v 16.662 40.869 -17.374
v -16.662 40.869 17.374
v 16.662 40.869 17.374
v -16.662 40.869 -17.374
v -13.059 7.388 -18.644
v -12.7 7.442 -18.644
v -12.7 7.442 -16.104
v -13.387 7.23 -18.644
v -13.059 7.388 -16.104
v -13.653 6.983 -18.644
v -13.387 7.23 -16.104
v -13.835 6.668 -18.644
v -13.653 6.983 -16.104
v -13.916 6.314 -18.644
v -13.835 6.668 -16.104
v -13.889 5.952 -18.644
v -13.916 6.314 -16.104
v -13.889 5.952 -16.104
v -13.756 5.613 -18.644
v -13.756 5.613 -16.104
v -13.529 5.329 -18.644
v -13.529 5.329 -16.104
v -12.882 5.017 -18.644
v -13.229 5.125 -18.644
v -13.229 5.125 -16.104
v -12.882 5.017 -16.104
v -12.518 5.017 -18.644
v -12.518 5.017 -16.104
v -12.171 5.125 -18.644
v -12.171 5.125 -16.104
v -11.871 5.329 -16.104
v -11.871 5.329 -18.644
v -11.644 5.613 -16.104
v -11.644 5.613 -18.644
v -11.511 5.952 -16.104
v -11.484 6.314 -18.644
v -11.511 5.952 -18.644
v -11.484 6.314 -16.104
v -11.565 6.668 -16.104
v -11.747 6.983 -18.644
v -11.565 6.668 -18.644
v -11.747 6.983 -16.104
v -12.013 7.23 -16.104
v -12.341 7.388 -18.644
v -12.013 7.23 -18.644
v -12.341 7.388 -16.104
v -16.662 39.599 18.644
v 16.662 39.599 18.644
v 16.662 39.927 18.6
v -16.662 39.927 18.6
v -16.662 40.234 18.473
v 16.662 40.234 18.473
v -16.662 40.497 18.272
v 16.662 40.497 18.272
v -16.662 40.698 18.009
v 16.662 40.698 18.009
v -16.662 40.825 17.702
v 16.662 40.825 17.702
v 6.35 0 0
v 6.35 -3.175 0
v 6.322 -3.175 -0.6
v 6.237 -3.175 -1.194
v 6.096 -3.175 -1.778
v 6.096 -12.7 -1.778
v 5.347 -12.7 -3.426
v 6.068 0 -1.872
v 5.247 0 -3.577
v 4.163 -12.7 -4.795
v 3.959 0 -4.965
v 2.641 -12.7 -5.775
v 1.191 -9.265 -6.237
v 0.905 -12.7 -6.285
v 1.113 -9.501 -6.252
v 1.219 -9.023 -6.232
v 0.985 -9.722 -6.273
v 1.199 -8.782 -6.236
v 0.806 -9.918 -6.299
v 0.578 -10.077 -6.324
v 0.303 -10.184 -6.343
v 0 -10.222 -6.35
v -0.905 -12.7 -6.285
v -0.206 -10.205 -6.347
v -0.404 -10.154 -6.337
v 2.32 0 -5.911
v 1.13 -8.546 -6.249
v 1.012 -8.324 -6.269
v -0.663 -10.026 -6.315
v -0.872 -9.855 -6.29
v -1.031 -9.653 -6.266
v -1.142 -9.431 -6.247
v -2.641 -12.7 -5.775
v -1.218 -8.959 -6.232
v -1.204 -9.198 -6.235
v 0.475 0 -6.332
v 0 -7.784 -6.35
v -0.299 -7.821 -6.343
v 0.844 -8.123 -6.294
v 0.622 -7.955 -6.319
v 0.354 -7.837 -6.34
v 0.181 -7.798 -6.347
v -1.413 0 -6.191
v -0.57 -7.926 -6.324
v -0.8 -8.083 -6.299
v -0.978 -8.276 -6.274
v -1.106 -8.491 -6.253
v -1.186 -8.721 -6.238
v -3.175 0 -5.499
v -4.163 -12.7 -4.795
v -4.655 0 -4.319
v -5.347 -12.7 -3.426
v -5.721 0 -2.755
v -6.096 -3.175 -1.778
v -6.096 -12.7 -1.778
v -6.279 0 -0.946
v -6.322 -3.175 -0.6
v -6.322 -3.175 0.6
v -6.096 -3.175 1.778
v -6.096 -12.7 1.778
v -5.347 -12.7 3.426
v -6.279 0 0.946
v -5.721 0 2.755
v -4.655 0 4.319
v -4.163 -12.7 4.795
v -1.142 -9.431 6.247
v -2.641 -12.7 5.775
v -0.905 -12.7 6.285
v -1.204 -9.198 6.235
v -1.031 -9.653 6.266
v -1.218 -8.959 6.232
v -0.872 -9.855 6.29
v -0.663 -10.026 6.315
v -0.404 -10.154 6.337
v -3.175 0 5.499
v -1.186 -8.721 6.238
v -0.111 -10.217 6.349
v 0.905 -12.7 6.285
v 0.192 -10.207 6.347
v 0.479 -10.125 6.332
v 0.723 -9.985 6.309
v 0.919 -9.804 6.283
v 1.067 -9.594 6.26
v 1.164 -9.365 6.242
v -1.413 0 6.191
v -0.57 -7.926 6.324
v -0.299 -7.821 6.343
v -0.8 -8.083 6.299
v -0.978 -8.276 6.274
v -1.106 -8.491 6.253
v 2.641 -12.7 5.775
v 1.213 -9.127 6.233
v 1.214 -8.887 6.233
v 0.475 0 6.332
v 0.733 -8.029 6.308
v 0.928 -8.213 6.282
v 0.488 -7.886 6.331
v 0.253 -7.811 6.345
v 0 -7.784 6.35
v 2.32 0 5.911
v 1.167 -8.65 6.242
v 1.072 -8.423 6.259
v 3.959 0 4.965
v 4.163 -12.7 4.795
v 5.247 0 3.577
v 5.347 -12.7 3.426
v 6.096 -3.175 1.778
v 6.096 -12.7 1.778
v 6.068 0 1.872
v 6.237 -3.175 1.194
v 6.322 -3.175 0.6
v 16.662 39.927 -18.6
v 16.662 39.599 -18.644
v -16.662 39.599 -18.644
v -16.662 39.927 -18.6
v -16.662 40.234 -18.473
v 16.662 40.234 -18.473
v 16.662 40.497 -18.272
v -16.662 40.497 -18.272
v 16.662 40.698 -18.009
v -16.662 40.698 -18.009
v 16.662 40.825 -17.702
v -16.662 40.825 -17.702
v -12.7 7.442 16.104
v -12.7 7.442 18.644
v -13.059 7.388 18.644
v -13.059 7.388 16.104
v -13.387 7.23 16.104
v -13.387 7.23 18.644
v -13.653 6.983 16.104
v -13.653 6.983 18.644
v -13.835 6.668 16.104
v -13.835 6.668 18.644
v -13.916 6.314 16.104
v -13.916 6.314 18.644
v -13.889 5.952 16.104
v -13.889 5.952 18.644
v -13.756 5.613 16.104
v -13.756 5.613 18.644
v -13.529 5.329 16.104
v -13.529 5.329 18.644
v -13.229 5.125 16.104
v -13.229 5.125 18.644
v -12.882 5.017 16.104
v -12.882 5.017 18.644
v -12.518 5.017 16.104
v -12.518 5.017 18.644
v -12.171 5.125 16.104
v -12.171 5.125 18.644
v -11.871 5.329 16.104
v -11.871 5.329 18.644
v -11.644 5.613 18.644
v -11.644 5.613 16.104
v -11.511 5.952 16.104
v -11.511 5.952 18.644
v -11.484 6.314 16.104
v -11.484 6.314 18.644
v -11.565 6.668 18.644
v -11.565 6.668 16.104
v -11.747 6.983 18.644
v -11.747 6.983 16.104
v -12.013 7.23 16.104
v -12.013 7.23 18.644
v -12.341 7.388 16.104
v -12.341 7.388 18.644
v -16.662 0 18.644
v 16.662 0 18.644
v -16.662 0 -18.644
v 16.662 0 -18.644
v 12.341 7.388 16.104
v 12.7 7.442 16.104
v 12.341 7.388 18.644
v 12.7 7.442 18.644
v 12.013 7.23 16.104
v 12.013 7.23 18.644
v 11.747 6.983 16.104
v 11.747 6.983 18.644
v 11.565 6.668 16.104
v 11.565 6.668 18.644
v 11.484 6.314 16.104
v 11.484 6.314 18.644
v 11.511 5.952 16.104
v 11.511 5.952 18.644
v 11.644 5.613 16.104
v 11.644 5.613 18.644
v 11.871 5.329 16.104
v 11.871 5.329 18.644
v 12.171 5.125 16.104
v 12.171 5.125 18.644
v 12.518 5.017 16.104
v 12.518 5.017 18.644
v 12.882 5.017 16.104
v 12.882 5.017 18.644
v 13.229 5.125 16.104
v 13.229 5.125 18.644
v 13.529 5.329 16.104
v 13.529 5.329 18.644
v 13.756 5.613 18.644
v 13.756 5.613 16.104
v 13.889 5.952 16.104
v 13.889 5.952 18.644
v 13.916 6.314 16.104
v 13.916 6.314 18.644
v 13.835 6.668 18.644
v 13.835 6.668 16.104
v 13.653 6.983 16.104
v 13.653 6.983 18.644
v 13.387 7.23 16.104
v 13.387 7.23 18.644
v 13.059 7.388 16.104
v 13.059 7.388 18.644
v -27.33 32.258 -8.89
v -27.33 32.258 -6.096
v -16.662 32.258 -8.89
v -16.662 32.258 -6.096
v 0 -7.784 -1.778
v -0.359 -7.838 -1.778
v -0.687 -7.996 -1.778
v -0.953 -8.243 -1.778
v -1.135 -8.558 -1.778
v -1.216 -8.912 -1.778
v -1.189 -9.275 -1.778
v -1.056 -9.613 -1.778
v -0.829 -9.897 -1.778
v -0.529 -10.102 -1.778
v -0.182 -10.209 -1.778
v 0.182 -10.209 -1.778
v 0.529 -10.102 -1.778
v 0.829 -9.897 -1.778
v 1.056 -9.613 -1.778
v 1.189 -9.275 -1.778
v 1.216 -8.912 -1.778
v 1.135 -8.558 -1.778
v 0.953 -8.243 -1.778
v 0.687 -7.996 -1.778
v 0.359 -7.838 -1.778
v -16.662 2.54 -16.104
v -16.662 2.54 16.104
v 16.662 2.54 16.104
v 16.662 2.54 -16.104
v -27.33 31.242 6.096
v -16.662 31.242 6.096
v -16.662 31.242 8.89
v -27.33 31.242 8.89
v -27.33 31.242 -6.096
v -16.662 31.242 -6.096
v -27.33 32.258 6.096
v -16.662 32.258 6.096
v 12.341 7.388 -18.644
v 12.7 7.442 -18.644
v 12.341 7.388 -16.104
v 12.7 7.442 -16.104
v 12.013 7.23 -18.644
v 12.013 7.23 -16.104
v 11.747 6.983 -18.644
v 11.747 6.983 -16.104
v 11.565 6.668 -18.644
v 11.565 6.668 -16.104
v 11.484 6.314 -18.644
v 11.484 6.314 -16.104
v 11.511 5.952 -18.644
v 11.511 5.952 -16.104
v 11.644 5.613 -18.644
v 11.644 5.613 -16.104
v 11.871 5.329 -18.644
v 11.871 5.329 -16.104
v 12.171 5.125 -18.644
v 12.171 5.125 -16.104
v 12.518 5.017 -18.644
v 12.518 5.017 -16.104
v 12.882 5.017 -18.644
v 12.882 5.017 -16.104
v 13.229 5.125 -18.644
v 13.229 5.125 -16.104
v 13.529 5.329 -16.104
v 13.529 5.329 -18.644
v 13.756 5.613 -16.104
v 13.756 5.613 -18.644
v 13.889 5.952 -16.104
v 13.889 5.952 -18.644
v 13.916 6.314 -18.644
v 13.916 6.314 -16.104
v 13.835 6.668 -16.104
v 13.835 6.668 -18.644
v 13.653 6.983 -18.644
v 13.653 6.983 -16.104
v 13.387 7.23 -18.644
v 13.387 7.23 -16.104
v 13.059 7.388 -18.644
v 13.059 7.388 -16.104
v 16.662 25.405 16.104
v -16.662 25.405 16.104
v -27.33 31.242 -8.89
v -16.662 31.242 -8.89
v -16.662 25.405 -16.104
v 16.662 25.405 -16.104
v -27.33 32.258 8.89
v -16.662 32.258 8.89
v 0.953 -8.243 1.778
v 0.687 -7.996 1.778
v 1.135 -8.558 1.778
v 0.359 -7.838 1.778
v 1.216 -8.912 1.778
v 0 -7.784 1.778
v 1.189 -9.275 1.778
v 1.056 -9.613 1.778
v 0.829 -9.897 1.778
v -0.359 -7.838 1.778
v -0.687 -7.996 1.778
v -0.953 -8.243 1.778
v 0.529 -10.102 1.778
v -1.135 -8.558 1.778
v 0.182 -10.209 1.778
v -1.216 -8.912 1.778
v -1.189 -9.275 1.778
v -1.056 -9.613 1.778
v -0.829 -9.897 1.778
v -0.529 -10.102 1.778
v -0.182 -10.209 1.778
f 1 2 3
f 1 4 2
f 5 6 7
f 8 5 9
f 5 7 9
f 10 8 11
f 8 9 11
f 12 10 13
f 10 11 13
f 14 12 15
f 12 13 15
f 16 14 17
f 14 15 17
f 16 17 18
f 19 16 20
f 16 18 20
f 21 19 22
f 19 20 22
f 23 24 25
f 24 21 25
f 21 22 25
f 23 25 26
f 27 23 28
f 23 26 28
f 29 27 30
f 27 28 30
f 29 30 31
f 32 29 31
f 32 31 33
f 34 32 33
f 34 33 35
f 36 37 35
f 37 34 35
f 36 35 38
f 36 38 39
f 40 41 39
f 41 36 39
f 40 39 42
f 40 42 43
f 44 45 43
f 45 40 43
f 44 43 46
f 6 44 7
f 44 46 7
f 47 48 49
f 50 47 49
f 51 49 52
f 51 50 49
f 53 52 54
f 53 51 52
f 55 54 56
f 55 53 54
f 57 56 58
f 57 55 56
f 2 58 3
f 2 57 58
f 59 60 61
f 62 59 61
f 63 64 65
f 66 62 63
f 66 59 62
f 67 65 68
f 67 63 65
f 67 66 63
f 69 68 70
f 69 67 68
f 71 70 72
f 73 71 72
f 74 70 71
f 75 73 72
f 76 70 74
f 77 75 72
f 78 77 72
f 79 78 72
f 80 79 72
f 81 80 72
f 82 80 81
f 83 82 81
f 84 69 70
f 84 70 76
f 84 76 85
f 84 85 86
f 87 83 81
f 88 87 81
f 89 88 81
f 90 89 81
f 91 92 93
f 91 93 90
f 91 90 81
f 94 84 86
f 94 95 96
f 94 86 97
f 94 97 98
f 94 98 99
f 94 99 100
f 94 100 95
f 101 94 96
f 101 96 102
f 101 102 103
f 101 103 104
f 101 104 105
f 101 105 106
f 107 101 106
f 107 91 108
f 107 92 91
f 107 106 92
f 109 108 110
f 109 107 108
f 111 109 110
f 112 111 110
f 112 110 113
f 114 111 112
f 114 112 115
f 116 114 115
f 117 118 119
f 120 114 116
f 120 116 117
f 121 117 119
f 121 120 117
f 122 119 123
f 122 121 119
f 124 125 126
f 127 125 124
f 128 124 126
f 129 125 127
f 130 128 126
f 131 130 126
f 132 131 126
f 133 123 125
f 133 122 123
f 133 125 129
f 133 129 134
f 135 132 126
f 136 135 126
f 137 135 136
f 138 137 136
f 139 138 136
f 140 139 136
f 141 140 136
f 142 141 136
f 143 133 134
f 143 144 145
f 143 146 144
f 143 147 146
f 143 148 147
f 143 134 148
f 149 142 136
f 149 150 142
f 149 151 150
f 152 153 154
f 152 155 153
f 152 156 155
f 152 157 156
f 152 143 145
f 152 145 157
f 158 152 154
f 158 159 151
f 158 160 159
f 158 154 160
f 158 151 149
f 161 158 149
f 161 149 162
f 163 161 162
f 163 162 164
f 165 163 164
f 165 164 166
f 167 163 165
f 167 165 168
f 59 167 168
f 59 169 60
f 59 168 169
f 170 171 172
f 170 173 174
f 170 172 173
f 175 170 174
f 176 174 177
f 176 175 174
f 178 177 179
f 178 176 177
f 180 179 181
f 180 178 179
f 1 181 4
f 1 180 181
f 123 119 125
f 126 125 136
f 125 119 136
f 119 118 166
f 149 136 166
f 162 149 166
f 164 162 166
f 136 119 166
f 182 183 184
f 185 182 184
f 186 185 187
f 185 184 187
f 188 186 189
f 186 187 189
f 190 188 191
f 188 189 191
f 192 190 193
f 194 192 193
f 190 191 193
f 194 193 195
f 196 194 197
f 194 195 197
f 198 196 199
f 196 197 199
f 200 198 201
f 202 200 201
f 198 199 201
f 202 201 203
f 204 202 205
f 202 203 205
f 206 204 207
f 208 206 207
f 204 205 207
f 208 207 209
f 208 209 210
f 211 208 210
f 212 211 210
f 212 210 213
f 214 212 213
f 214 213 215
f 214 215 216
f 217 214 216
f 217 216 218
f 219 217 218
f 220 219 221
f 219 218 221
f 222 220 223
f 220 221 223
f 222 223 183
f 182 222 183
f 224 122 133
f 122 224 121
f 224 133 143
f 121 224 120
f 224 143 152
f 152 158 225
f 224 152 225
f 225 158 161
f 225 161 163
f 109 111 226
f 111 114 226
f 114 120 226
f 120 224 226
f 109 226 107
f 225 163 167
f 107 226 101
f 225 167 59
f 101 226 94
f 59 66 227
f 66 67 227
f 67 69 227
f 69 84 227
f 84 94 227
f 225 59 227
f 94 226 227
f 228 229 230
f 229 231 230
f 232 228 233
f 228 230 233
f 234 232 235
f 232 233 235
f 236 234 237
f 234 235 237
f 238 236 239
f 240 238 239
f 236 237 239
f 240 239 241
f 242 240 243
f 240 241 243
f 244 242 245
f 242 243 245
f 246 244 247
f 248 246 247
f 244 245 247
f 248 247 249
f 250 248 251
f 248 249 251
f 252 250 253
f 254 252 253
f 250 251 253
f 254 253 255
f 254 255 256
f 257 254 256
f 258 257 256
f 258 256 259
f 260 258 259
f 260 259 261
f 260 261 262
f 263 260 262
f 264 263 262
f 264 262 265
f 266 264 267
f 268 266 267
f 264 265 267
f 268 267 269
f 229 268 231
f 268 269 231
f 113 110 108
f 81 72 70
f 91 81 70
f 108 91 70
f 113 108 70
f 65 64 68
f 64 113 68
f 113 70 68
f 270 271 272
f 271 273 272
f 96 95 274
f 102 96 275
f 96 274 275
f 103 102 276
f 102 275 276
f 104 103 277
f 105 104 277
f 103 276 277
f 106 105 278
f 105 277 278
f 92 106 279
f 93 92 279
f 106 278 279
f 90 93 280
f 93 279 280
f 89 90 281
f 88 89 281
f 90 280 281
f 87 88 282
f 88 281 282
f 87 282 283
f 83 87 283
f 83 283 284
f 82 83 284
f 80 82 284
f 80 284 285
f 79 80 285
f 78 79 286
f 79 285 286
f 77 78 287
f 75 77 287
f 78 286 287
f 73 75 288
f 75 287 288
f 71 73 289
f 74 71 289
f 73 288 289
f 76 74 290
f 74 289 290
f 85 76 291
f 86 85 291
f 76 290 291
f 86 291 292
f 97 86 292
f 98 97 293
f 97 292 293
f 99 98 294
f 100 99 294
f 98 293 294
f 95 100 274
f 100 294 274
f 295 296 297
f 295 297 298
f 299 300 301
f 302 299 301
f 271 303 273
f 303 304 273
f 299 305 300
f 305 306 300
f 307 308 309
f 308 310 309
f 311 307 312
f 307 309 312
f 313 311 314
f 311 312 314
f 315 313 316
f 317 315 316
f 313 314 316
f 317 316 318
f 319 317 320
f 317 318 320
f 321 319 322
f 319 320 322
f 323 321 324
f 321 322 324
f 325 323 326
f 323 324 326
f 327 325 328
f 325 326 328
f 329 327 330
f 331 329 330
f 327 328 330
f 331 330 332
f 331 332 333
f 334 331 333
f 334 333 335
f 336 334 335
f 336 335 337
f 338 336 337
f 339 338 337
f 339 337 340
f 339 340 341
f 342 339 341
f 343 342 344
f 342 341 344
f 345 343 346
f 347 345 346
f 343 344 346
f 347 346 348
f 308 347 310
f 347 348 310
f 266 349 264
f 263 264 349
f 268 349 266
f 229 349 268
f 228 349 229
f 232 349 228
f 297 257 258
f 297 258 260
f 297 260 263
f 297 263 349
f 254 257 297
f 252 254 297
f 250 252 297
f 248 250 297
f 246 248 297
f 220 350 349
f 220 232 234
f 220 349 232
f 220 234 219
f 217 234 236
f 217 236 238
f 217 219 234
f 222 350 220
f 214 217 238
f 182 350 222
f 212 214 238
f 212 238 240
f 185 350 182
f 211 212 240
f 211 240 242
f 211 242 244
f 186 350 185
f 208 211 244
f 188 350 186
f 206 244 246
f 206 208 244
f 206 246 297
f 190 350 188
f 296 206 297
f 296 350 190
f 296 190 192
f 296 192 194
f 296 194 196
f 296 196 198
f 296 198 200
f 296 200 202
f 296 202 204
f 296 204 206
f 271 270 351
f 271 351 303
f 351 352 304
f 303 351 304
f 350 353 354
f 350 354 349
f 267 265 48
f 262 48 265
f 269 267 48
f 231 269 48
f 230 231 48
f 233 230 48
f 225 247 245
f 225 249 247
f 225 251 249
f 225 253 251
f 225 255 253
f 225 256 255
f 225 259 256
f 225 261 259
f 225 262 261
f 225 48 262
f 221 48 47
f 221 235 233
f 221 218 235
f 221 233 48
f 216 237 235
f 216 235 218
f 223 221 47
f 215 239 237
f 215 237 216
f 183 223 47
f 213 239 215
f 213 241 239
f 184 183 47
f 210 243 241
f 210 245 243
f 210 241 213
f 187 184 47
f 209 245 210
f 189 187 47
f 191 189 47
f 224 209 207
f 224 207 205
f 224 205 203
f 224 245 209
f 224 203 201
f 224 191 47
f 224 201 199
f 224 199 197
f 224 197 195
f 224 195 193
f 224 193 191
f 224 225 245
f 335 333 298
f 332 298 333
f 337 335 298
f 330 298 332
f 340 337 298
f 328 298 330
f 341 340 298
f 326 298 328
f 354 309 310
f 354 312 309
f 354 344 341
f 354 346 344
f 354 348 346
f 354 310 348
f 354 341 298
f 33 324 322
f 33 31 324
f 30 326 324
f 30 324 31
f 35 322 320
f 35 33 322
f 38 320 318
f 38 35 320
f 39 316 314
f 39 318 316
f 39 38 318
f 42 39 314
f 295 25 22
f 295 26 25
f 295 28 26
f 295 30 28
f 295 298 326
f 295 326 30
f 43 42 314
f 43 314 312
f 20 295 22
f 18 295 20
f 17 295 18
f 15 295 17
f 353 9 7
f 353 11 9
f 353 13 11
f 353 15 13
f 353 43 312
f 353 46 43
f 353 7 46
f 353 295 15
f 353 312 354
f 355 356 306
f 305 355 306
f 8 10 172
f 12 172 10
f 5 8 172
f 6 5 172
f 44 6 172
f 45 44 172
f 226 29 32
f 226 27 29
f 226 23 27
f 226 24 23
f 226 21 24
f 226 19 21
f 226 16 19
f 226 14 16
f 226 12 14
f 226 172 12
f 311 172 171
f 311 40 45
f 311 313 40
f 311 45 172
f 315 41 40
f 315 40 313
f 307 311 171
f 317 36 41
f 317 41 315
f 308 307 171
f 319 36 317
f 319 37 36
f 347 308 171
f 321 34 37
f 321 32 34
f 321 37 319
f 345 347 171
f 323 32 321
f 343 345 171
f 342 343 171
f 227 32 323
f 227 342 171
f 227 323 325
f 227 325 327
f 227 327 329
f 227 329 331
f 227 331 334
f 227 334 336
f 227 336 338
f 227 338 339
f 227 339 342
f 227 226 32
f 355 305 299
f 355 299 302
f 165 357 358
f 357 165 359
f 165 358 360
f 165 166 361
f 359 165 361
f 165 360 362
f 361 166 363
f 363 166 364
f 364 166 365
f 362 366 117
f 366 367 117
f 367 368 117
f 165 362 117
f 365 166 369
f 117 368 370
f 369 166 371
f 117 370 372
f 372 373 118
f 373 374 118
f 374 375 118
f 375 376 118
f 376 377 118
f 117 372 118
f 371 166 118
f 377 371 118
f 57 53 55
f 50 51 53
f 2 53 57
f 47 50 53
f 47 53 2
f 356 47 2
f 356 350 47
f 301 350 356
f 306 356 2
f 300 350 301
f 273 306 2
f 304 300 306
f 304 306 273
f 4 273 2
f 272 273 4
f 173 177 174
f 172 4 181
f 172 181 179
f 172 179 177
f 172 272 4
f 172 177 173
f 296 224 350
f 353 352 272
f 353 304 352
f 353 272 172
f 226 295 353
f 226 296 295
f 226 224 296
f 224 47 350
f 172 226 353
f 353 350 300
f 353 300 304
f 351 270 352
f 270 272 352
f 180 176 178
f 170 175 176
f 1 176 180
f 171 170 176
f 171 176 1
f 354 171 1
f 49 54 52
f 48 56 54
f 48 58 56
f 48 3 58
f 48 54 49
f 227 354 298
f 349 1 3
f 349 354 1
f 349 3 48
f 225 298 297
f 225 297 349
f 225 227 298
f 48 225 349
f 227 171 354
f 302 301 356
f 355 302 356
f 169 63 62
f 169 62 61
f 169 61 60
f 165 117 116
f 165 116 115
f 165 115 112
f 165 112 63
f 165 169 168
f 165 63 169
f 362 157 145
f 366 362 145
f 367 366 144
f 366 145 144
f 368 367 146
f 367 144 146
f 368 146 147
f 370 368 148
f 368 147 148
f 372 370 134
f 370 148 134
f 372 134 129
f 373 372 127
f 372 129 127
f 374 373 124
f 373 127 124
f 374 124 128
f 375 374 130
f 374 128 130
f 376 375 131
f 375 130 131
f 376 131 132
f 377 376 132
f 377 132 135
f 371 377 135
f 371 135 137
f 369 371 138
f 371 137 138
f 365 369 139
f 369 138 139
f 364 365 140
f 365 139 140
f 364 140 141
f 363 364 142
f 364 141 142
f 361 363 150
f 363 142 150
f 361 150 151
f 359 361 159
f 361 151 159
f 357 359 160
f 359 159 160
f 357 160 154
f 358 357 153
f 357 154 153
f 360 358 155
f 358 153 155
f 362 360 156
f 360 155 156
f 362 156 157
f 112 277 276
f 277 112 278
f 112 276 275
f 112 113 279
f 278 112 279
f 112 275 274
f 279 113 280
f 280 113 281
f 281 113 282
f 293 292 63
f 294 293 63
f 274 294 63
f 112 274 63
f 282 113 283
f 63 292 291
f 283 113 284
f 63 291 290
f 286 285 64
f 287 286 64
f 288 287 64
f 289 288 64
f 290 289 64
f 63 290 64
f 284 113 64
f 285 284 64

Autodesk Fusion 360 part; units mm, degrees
sketch "Sketch1" plane through (0, 0, 0) normal (0, 1, 0) x (1, 0, 0)
  line L0 (16.6624, -18.6436) -> (-16.6624, -18.6436)
  line L1 (-16.6624, -18.6436) -> (-16.6624, 18.6436)
  line L2 (-16.6624, 18.6436) -> (16.6624, 18.6436)
  line L3 (16.6624, 18.6436) -> (16.6624, -18.6436)
  line L4 (16.6624, -18.6436) -> (-16.6624, 18.6436) construction
  line L5 (-16.6624, -18.6436) -> (16.6624, 18.6436) construction
  dimension "d1" = 33.3248
  dimension "d2" = 37.2872
extrude "Extrude1" add sketch "Sketch1" along normal blind 40.8686
cylinder "CylinderPrimitive1" add diameter 12.7 height -12.7 placed x (1, 0, 0) y (0, 0, -1) z (0, 1, 0) at (0, 0, 0)
sketch "Sketch3" plane through (0, -12.7, 0) normal (0, -1, 0) x (1, 0, 0)
  circle A0 centre (0, 0) radius 6.35
  line L0 (-6.35, -1.778) -> (6.35, -1.778)
  arc A1 (6.35, -1.778) -> (6.35, 1.778) centre (6.35, 0) ccw
  line L1 (6.35, 1.778) -> (-6.35, 1.778)
  arc A2 (-6.35, 1.778) -> (-6.35, -1.778) centre (-6.35, 0) ccw
  line L2 (-6.35, 0) -> (6.35, 0) construction
extrude "Extrude2" cut sketch "Sketch3" against normal blind 9.525 contours A0 L0 L1
fillet "Fillet1" radius 1.27 2 edges at (0, 40.8686, 18.6436) (0, 40.8686, -18.6436)
hole "Hole1" at (0, -9.0033, -6.35) direction (0, 0, 1) diameter 2.4384 depth 37.2872 tip angle 180
sketch "Sketch4" plane through (0, 0, -18.6436) normal (0, 0, -1) x (-1, 0, 0)
  line L0 (16.6624, 39.5986) -> (-16.6624, 39.5986)
  line L1 (-16.6624, 39.5986) -> (-16.6624, 0)
  line L2 (-16.6624, 0) -> (16.6624, 0)
  line L3 (16.6624, 0) -> (16.6624, 39.5986)
  line L4 (0, 0) -> (0, 6.223)
  line L5 (0, 6.223) -> (12.7, 6.223)
  line L6 (12.7, 6.223) -> (0, 6.223)
  line L7 (0, 6.223) -> (-12.7, 6.223)
  dimension "d13" = 6.223
  dimension "d14" = 12.7
hole "Hole2" at (12.7, 6.223, -18.6436) direction (0, 0, 1) diameter 2.4384 depth 37.2872 tip angle 180
mirror "Mirror1" about plane through (0, 0, 0) normal (1, 0, 0) of "Hole2"
sketch "Sketch5" plane through (-16.6624, 0, 0) normal (-1, 0, 0) x (0, 0, 1)
  arc A0 (-17.3736, 40.8686) -> (-18.6436, 39.5986) centre (-17.3736, 39.5986) ccw
  line L0 (-18.6436, 39.5986) -> (-18.6436, 0)
  line L1 (-18.6436, 0) -> (18.6436, 0)
  line L2 (18.6436, 0) -> (18.6436, 39.5986)
  arc A1 (18.6436, 39.5986) -> (17.3736, 40.8686) centre (17.3736, 39.5986) ccw
  line L3 (17.3736, 40.8686) -> (-17.3736, 40.8686)
  line L4 (-16.1036, 25.4052) -> (16.1036, 25.4052)
  line L5 (16.1036, 25.4052) -> (16.1036, 2.54)
  line L6 (16.1036, 2.54) -> (-16.1036, 2.54)
  line L7 (-16.1036, 2.54) -> (-16.1036, 25.4052)
  line L8 (16.1036, 13.9726) -> (18.6436, 13.9726) construction
  line L9 (-16.1036, 13.9726) -> (-18.6436, 13.9802) construction
  line L10 (0, 2.54) -> (0, 0) construction
  line L11 (0, 25.4052) -> (0, 40.8686) construction
extrude "Extrude3" cut sketch "Sketch5" against normal blind 30.8102 contours L4 L5 L6 L7
sketch "Sketch6" plane through (-16.6624, 0, 0) normal (-1, 0, 0) x (0, 0, 1)
  line L0 (16.1036, 25.4052) -> (16.1036, 2.54)
  line L1 (16.1036, 2.54) -> (-16.1036, 2.54)
  line L2 (-16.1036, 2.54) -> (-16.1036, 25.4052)
  line L3 (-16.1036, 25.4052) -> (16.1036, 25.4052)
  arc A0 (-17.3736, 40.8686) -> (-18.6436, 39.5986) centre (-17.3736, 39.5986) ccw
  line L4 (-18.6436, 39.5986) -> (-18.6436, 0)
  line L5 (-18.6436, 0) -> (18.6436, 0)
  line L6 (18.6436, 0) -> (18.6436, 39.5986)
  arc A1 (18.6436, 39.5986) -> (17.3736, 40.8686) centre (17.3736, 39.5986) ccw
  line L7 (17.3736, 40.8686) -> (-17.3736, 40.8686)
  line L8 (0, 40.8686) -> (0, 31.75) construction
  line L9 (0, 31.75) -> (7.493, 31.75) construction
  line L10 (8.89, 32.258) -> (6.096, 32.258)
  line L11 (6.096, 32.258) -> (6.096, 31.242)
  line L12 (6.096, 31.242) -> (8.89, 31.242)
  line L13 (8.89, 31.242) -> (8.89, 32.258)
  line L14 (8.89, 32.258) -> (6.096, 31.242) construction
  line L15 (6.096, 32.258) -> (8.89, 31.242) construction
  dimension "d21" = 7.493
extrude "Extrude4" add sketch "Sketch6" along normal blind 10.668 contours L10 L11 L12 L13
mirror "Mirror2" about plane through (0, 0, 0) normal (0, 0, 1) of "Extrude4"
extrude "Extrude5" cut 1 faces at (14.1478, 17.7834, 5.3679) along direction (1, 0, 0) blind 7.62
